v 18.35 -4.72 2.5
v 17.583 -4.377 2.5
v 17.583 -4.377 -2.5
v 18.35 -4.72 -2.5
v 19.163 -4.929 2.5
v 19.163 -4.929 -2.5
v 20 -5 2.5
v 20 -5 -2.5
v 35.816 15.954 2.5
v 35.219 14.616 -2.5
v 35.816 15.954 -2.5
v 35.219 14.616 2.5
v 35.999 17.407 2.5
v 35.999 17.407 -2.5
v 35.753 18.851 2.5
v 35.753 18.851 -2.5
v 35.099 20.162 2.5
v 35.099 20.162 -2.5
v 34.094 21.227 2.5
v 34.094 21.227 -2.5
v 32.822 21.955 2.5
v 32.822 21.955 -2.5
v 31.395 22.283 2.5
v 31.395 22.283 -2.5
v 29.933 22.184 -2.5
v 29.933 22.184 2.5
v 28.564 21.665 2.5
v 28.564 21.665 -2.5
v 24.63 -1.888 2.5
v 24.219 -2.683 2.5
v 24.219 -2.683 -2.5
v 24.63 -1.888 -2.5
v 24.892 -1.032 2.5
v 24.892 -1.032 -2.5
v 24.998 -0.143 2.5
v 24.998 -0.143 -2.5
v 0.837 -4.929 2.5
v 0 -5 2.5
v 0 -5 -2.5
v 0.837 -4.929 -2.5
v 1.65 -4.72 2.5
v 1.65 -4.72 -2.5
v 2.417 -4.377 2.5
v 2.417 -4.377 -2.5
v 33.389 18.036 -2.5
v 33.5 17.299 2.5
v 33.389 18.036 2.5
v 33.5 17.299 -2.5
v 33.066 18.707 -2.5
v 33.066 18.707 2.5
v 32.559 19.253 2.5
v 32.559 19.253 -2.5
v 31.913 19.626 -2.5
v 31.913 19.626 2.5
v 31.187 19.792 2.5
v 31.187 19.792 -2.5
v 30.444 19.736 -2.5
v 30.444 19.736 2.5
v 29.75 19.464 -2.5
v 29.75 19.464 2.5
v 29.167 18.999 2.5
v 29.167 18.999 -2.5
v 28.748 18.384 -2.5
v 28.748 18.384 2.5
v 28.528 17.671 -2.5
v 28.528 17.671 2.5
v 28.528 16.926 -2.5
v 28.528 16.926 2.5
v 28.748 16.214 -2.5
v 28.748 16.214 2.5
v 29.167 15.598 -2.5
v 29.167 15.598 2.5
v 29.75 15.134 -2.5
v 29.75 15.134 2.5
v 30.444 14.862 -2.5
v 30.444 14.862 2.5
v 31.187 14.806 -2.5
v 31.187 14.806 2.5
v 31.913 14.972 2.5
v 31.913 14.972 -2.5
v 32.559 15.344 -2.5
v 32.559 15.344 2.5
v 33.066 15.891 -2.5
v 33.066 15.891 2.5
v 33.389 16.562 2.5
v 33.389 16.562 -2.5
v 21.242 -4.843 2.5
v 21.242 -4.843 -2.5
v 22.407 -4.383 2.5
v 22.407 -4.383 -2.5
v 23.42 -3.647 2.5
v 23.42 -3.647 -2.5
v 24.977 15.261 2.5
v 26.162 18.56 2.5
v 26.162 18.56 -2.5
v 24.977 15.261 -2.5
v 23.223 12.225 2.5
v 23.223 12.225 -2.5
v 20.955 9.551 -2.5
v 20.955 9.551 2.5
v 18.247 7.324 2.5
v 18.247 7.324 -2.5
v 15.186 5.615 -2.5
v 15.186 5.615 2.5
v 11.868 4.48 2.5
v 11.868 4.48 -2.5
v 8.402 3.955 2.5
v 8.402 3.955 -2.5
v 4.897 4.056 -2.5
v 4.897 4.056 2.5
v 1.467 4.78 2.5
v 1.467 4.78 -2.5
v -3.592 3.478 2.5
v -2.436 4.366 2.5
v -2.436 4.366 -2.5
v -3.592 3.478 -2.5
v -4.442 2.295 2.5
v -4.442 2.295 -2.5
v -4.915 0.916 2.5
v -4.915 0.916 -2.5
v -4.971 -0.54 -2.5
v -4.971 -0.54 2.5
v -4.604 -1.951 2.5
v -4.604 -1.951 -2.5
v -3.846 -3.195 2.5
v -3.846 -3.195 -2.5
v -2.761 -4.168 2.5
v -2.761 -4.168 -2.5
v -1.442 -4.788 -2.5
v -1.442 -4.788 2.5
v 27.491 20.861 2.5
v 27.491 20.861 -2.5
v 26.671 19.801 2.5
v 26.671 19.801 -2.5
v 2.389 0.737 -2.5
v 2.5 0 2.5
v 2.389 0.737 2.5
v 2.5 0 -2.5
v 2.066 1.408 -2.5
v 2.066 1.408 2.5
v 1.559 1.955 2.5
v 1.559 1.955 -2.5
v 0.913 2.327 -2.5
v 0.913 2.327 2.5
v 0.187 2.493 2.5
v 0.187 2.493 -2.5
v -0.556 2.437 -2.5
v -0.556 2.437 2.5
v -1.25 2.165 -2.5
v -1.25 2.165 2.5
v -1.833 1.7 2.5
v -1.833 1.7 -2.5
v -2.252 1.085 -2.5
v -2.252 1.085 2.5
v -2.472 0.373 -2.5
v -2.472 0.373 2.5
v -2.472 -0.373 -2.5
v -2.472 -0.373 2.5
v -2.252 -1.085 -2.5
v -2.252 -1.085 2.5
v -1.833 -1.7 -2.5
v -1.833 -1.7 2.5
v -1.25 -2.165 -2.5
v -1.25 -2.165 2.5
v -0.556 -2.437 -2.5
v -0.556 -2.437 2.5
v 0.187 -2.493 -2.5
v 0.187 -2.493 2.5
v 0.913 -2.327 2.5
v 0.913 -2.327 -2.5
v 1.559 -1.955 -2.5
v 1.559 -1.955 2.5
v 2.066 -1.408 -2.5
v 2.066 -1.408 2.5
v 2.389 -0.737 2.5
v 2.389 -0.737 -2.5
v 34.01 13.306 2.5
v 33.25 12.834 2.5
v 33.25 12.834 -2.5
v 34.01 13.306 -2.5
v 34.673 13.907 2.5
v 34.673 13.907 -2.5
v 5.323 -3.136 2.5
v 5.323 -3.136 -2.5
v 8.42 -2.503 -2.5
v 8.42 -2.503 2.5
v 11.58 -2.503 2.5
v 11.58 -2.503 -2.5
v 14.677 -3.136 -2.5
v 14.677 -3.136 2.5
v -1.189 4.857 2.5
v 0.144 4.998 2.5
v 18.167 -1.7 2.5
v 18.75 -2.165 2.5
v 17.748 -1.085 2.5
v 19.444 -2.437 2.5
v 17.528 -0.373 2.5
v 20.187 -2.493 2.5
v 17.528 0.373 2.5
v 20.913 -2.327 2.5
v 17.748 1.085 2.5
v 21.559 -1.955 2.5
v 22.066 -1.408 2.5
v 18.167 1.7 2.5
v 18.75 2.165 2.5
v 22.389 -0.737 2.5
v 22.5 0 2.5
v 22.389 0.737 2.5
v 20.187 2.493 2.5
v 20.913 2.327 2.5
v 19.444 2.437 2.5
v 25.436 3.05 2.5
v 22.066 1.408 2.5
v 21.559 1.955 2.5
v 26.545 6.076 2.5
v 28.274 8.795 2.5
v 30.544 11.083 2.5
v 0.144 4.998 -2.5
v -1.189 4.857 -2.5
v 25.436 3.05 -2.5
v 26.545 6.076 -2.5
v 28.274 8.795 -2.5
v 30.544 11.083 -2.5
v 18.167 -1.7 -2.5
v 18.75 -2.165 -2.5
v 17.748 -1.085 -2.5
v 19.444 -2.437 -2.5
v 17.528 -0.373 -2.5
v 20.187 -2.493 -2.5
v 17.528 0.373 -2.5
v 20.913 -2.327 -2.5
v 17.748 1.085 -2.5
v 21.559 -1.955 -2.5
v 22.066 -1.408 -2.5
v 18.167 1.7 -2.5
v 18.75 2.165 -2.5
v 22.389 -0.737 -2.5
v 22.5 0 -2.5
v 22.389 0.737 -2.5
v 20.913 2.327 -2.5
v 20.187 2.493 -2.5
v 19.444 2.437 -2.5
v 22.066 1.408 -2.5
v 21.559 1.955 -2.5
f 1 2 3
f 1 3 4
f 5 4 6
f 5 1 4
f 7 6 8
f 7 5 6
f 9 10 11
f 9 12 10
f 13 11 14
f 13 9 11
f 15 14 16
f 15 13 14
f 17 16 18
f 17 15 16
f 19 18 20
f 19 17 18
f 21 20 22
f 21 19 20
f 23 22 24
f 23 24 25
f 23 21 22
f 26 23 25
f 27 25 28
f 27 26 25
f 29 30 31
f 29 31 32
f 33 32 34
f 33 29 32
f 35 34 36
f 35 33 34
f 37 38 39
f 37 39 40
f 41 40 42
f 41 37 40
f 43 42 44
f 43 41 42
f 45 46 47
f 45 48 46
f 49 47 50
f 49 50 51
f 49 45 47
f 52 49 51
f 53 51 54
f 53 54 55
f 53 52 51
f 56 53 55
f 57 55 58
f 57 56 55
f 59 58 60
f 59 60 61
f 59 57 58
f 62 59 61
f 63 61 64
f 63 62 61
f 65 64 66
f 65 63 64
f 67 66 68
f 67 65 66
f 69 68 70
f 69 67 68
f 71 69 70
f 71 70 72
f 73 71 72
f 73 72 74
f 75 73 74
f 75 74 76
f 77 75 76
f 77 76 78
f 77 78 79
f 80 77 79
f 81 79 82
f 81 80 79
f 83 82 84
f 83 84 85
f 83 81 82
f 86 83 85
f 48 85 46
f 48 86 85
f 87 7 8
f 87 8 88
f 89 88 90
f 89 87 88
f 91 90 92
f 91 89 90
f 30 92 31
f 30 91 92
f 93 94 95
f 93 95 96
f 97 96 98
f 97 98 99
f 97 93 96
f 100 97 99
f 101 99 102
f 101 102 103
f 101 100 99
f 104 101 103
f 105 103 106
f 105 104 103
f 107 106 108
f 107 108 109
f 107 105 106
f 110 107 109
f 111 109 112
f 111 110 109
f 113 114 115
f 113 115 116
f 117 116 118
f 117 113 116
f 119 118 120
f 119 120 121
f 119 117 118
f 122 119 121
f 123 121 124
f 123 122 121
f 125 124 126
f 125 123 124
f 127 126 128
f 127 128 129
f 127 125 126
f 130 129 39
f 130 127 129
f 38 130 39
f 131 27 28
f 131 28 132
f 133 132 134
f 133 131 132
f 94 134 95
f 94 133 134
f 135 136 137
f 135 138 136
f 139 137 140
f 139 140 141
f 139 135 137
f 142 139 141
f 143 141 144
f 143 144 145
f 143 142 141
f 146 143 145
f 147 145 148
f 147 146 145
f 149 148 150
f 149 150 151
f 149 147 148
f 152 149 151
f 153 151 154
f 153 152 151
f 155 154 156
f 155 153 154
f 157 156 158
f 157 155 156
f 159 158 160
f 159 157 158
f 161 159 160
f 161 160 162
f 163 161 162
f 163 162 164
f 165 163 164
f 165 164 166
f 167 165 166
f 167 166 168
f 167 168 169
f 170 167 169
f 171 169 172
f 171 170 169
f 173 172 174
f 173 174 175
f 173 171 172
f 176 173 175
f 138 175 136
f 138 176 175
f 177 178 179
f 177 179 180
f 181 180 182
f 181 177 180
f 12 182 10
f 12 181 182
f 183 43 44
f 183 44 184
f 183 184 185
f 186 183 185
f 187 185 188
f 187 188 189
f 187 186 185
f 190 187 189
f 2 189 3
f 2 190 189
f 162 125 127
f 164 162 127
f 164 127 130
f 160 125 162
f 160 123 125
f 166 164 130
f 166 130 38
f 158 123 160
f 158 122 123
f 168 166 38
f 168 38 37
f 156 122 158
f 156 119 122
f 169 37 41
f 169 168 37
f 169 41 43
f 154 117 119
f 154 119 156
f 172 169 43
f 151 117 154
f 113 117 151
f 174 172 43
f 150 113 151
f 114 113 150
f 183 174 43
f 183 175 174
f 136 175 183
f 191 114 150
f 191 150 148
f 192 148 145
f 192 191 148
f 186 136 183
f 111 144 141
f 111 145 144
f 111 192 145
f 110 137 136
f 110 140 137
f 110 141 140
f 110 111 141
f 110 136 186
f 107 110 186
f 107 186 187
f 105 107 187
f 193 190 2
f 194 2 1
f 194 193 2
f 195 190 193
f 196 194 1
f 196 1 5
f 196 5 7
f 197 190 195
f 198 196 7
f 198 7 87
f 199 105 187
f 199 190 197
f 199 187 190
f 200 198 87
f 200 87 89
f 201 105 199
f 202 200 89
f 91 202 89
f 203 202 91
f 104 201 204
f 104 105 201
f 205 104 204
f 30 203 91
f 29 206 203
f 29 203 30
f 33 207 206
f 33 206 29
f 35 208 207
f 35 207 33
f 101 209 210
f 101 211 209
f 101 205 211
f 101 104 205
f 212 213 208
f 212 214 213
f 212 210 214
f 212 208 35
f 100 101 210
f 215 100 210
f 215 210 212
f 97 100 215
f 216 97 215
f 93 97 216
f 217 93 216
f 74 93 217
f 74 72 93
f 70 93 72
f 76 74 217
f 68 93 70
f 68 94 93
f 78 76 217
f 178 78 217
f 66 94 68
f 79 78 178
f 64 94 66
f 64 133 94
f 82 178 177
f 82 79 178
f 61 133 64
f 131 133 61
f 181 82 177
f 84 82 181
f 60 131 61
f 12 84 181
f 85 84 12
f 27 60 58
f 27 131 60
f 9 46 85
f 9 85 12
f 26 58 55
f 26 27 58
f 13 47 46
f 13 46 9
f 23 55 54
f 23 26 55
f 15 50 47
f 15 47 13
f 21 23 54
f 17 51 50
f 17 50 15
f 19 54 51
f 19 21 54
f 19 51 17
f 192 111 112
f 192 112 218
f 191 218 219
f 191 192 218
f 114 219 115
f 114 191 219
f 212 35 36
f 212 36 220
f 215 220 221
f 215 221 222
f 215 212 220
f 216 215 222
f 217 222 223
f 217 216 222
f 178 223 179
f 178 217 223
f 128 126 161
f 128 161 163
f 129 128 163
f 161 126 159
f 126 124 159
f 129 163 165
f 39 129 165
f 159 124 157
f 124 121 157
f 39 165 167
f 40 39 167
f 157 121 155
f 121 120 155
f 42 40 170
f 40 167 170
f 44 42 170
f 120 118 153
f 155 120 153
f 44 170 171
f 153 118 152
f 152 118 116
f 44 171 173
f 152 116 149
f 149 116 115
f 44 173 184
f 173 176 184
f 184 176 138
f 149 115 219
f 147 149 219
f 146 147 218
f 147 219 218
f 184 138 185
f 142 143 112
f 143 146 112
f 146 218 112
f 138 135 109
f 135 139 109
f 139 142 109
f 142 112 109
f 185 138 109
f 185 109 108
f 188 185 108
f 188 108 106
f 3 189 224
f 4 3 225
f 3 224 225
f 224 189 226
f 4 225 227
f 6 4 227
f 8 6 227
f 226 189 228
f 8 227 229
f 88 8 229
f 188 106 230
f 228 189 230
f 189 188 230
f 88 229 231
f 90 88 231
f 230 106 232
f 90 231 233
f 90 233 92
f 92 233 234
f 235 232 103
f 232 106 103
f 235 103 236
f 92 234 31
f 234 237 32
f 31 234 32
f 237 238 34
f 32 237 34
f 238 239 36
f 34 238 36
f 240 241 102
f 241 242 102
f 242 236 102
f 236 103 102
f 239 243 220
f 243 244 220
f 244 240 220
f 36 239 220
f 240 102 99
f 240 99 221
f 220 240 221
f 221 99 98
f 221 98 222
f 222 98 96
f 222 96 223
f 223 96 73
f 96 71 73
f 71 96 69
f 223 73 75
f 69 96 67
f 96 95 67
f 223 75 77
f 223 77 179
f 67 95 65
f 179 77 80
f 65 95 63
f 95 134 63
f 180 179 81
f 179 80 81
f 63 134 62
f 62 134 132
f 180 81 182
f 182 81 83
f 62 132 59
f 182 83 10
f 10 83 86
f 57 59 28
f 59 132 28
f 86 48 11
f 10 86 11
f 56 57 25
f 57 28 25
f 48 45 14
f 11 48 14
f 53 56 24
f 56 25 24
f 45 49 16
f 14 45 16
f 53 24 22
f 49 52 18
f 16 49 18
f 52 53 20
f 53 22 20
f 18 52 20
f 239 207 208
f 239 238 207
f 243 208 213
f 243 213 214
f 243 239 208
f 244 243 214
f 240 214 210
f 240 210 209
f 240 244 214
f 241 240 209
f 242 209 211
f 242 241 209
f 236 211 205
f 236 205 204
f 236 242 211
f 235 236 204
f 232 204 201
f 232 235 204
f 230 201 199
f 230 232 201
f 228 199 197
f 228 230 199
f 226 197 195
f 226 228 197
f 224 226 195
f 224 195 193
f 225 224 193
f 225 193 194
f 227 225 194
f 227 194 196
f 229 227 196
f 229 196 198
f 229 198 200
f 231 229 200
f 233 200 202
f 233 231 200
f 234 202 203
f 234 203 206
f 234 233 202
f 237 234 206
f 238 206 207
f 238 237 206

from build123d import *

# Parameters (mm, degrees)
SKETCH_1_R          = 2.5
EXTRUDE_1_DEPTH     = 2.5
SKETCH_2_OUTSIDE_W  = 52.902
SKETCH_2_OUTSIDE_H  = 39.201
CUT_EXTRUDE_1_DEPTH = 5


with BuildPart() as part:
    # 草圖1 → 填料-伸長1 (new body, symmetric)
    with BuildSketch(Plane.XY):
        with BuildLine():
            Line((28.563543114, 21.665041075), (-2.436456886, 4.366197183))
            ThreePointArc((-2.436456886, 4.366197183), (-4.838955771, -1.258772037), (0, -5))
            Line((0, -5), (20, -5))
            ThreePointArc((20, -5), (22.406799312, -4.382615323), (24.219230218, -2.682926829))
            Line((24.219230218, -2.682926829), (35.219230218, 14.615917063))
            ThreePointArc((35.219230218, 14.615917063), (34.635534008, 20.7314657), (28.563543114, 21.665041075))
        make_face()
        Circle(SKETCH_1_R, mode=Mode.SUBTRACT)
        with Locations((20, 0)):
            Circle(SKETCH_1_R, mode=Mode.SUBTRACT)
        with Locations((31, 17.298843892)):
            Circle(SKETCH_1_R, mode=Mode.SUBTRACT)
    extrude(amount=EXTRUDE_1_DEPTH, both=True)

    # 草圖2 outside → 除料-伸長1 (cut)
    with BuildSketch(Plane.XY.offset(2.5)):
        with Locations((15.5, 8.6495)):
            Rectangle(SKETCH_2_OUTSIDE_W, SKETCH_2_OUTSIDE_H)
        with BuildLine():
            ThreePointArc((1.466809122, 4.780007427), (-4.973314603, -0.515889385), (2.416696414, -4.377165572))
            ThreePointArc((2.416696414, -4.377165572), (10, -2.422785813), (17.583303586, -4.377165572))
            ThreePointArc((17.583303586, -4.377165572), (22.479295807, -4.342014774), (24.997943304, -0.143397121))
            ThreePointArc((24.997943304, -0.143397121), (27.336128289, 7.481863506), (33.249748223, 12.833574255))
            ThreePointArc((33.249748223, 12.833574255), (34.142354704, 21.188009216), (26.161789901, 18.560478956))
            ThreePointArc((26.161789901, 18.560478956), (16.754800429, 6.400785359), (1.466809122, 4.780007427))
        make_face(mode=Mode.SUBTRACT)
    extrude(amount=-CUT_EXTRUDE_1_DEPTH, mode=Mode.SUBTRACT)


solid = part.part
